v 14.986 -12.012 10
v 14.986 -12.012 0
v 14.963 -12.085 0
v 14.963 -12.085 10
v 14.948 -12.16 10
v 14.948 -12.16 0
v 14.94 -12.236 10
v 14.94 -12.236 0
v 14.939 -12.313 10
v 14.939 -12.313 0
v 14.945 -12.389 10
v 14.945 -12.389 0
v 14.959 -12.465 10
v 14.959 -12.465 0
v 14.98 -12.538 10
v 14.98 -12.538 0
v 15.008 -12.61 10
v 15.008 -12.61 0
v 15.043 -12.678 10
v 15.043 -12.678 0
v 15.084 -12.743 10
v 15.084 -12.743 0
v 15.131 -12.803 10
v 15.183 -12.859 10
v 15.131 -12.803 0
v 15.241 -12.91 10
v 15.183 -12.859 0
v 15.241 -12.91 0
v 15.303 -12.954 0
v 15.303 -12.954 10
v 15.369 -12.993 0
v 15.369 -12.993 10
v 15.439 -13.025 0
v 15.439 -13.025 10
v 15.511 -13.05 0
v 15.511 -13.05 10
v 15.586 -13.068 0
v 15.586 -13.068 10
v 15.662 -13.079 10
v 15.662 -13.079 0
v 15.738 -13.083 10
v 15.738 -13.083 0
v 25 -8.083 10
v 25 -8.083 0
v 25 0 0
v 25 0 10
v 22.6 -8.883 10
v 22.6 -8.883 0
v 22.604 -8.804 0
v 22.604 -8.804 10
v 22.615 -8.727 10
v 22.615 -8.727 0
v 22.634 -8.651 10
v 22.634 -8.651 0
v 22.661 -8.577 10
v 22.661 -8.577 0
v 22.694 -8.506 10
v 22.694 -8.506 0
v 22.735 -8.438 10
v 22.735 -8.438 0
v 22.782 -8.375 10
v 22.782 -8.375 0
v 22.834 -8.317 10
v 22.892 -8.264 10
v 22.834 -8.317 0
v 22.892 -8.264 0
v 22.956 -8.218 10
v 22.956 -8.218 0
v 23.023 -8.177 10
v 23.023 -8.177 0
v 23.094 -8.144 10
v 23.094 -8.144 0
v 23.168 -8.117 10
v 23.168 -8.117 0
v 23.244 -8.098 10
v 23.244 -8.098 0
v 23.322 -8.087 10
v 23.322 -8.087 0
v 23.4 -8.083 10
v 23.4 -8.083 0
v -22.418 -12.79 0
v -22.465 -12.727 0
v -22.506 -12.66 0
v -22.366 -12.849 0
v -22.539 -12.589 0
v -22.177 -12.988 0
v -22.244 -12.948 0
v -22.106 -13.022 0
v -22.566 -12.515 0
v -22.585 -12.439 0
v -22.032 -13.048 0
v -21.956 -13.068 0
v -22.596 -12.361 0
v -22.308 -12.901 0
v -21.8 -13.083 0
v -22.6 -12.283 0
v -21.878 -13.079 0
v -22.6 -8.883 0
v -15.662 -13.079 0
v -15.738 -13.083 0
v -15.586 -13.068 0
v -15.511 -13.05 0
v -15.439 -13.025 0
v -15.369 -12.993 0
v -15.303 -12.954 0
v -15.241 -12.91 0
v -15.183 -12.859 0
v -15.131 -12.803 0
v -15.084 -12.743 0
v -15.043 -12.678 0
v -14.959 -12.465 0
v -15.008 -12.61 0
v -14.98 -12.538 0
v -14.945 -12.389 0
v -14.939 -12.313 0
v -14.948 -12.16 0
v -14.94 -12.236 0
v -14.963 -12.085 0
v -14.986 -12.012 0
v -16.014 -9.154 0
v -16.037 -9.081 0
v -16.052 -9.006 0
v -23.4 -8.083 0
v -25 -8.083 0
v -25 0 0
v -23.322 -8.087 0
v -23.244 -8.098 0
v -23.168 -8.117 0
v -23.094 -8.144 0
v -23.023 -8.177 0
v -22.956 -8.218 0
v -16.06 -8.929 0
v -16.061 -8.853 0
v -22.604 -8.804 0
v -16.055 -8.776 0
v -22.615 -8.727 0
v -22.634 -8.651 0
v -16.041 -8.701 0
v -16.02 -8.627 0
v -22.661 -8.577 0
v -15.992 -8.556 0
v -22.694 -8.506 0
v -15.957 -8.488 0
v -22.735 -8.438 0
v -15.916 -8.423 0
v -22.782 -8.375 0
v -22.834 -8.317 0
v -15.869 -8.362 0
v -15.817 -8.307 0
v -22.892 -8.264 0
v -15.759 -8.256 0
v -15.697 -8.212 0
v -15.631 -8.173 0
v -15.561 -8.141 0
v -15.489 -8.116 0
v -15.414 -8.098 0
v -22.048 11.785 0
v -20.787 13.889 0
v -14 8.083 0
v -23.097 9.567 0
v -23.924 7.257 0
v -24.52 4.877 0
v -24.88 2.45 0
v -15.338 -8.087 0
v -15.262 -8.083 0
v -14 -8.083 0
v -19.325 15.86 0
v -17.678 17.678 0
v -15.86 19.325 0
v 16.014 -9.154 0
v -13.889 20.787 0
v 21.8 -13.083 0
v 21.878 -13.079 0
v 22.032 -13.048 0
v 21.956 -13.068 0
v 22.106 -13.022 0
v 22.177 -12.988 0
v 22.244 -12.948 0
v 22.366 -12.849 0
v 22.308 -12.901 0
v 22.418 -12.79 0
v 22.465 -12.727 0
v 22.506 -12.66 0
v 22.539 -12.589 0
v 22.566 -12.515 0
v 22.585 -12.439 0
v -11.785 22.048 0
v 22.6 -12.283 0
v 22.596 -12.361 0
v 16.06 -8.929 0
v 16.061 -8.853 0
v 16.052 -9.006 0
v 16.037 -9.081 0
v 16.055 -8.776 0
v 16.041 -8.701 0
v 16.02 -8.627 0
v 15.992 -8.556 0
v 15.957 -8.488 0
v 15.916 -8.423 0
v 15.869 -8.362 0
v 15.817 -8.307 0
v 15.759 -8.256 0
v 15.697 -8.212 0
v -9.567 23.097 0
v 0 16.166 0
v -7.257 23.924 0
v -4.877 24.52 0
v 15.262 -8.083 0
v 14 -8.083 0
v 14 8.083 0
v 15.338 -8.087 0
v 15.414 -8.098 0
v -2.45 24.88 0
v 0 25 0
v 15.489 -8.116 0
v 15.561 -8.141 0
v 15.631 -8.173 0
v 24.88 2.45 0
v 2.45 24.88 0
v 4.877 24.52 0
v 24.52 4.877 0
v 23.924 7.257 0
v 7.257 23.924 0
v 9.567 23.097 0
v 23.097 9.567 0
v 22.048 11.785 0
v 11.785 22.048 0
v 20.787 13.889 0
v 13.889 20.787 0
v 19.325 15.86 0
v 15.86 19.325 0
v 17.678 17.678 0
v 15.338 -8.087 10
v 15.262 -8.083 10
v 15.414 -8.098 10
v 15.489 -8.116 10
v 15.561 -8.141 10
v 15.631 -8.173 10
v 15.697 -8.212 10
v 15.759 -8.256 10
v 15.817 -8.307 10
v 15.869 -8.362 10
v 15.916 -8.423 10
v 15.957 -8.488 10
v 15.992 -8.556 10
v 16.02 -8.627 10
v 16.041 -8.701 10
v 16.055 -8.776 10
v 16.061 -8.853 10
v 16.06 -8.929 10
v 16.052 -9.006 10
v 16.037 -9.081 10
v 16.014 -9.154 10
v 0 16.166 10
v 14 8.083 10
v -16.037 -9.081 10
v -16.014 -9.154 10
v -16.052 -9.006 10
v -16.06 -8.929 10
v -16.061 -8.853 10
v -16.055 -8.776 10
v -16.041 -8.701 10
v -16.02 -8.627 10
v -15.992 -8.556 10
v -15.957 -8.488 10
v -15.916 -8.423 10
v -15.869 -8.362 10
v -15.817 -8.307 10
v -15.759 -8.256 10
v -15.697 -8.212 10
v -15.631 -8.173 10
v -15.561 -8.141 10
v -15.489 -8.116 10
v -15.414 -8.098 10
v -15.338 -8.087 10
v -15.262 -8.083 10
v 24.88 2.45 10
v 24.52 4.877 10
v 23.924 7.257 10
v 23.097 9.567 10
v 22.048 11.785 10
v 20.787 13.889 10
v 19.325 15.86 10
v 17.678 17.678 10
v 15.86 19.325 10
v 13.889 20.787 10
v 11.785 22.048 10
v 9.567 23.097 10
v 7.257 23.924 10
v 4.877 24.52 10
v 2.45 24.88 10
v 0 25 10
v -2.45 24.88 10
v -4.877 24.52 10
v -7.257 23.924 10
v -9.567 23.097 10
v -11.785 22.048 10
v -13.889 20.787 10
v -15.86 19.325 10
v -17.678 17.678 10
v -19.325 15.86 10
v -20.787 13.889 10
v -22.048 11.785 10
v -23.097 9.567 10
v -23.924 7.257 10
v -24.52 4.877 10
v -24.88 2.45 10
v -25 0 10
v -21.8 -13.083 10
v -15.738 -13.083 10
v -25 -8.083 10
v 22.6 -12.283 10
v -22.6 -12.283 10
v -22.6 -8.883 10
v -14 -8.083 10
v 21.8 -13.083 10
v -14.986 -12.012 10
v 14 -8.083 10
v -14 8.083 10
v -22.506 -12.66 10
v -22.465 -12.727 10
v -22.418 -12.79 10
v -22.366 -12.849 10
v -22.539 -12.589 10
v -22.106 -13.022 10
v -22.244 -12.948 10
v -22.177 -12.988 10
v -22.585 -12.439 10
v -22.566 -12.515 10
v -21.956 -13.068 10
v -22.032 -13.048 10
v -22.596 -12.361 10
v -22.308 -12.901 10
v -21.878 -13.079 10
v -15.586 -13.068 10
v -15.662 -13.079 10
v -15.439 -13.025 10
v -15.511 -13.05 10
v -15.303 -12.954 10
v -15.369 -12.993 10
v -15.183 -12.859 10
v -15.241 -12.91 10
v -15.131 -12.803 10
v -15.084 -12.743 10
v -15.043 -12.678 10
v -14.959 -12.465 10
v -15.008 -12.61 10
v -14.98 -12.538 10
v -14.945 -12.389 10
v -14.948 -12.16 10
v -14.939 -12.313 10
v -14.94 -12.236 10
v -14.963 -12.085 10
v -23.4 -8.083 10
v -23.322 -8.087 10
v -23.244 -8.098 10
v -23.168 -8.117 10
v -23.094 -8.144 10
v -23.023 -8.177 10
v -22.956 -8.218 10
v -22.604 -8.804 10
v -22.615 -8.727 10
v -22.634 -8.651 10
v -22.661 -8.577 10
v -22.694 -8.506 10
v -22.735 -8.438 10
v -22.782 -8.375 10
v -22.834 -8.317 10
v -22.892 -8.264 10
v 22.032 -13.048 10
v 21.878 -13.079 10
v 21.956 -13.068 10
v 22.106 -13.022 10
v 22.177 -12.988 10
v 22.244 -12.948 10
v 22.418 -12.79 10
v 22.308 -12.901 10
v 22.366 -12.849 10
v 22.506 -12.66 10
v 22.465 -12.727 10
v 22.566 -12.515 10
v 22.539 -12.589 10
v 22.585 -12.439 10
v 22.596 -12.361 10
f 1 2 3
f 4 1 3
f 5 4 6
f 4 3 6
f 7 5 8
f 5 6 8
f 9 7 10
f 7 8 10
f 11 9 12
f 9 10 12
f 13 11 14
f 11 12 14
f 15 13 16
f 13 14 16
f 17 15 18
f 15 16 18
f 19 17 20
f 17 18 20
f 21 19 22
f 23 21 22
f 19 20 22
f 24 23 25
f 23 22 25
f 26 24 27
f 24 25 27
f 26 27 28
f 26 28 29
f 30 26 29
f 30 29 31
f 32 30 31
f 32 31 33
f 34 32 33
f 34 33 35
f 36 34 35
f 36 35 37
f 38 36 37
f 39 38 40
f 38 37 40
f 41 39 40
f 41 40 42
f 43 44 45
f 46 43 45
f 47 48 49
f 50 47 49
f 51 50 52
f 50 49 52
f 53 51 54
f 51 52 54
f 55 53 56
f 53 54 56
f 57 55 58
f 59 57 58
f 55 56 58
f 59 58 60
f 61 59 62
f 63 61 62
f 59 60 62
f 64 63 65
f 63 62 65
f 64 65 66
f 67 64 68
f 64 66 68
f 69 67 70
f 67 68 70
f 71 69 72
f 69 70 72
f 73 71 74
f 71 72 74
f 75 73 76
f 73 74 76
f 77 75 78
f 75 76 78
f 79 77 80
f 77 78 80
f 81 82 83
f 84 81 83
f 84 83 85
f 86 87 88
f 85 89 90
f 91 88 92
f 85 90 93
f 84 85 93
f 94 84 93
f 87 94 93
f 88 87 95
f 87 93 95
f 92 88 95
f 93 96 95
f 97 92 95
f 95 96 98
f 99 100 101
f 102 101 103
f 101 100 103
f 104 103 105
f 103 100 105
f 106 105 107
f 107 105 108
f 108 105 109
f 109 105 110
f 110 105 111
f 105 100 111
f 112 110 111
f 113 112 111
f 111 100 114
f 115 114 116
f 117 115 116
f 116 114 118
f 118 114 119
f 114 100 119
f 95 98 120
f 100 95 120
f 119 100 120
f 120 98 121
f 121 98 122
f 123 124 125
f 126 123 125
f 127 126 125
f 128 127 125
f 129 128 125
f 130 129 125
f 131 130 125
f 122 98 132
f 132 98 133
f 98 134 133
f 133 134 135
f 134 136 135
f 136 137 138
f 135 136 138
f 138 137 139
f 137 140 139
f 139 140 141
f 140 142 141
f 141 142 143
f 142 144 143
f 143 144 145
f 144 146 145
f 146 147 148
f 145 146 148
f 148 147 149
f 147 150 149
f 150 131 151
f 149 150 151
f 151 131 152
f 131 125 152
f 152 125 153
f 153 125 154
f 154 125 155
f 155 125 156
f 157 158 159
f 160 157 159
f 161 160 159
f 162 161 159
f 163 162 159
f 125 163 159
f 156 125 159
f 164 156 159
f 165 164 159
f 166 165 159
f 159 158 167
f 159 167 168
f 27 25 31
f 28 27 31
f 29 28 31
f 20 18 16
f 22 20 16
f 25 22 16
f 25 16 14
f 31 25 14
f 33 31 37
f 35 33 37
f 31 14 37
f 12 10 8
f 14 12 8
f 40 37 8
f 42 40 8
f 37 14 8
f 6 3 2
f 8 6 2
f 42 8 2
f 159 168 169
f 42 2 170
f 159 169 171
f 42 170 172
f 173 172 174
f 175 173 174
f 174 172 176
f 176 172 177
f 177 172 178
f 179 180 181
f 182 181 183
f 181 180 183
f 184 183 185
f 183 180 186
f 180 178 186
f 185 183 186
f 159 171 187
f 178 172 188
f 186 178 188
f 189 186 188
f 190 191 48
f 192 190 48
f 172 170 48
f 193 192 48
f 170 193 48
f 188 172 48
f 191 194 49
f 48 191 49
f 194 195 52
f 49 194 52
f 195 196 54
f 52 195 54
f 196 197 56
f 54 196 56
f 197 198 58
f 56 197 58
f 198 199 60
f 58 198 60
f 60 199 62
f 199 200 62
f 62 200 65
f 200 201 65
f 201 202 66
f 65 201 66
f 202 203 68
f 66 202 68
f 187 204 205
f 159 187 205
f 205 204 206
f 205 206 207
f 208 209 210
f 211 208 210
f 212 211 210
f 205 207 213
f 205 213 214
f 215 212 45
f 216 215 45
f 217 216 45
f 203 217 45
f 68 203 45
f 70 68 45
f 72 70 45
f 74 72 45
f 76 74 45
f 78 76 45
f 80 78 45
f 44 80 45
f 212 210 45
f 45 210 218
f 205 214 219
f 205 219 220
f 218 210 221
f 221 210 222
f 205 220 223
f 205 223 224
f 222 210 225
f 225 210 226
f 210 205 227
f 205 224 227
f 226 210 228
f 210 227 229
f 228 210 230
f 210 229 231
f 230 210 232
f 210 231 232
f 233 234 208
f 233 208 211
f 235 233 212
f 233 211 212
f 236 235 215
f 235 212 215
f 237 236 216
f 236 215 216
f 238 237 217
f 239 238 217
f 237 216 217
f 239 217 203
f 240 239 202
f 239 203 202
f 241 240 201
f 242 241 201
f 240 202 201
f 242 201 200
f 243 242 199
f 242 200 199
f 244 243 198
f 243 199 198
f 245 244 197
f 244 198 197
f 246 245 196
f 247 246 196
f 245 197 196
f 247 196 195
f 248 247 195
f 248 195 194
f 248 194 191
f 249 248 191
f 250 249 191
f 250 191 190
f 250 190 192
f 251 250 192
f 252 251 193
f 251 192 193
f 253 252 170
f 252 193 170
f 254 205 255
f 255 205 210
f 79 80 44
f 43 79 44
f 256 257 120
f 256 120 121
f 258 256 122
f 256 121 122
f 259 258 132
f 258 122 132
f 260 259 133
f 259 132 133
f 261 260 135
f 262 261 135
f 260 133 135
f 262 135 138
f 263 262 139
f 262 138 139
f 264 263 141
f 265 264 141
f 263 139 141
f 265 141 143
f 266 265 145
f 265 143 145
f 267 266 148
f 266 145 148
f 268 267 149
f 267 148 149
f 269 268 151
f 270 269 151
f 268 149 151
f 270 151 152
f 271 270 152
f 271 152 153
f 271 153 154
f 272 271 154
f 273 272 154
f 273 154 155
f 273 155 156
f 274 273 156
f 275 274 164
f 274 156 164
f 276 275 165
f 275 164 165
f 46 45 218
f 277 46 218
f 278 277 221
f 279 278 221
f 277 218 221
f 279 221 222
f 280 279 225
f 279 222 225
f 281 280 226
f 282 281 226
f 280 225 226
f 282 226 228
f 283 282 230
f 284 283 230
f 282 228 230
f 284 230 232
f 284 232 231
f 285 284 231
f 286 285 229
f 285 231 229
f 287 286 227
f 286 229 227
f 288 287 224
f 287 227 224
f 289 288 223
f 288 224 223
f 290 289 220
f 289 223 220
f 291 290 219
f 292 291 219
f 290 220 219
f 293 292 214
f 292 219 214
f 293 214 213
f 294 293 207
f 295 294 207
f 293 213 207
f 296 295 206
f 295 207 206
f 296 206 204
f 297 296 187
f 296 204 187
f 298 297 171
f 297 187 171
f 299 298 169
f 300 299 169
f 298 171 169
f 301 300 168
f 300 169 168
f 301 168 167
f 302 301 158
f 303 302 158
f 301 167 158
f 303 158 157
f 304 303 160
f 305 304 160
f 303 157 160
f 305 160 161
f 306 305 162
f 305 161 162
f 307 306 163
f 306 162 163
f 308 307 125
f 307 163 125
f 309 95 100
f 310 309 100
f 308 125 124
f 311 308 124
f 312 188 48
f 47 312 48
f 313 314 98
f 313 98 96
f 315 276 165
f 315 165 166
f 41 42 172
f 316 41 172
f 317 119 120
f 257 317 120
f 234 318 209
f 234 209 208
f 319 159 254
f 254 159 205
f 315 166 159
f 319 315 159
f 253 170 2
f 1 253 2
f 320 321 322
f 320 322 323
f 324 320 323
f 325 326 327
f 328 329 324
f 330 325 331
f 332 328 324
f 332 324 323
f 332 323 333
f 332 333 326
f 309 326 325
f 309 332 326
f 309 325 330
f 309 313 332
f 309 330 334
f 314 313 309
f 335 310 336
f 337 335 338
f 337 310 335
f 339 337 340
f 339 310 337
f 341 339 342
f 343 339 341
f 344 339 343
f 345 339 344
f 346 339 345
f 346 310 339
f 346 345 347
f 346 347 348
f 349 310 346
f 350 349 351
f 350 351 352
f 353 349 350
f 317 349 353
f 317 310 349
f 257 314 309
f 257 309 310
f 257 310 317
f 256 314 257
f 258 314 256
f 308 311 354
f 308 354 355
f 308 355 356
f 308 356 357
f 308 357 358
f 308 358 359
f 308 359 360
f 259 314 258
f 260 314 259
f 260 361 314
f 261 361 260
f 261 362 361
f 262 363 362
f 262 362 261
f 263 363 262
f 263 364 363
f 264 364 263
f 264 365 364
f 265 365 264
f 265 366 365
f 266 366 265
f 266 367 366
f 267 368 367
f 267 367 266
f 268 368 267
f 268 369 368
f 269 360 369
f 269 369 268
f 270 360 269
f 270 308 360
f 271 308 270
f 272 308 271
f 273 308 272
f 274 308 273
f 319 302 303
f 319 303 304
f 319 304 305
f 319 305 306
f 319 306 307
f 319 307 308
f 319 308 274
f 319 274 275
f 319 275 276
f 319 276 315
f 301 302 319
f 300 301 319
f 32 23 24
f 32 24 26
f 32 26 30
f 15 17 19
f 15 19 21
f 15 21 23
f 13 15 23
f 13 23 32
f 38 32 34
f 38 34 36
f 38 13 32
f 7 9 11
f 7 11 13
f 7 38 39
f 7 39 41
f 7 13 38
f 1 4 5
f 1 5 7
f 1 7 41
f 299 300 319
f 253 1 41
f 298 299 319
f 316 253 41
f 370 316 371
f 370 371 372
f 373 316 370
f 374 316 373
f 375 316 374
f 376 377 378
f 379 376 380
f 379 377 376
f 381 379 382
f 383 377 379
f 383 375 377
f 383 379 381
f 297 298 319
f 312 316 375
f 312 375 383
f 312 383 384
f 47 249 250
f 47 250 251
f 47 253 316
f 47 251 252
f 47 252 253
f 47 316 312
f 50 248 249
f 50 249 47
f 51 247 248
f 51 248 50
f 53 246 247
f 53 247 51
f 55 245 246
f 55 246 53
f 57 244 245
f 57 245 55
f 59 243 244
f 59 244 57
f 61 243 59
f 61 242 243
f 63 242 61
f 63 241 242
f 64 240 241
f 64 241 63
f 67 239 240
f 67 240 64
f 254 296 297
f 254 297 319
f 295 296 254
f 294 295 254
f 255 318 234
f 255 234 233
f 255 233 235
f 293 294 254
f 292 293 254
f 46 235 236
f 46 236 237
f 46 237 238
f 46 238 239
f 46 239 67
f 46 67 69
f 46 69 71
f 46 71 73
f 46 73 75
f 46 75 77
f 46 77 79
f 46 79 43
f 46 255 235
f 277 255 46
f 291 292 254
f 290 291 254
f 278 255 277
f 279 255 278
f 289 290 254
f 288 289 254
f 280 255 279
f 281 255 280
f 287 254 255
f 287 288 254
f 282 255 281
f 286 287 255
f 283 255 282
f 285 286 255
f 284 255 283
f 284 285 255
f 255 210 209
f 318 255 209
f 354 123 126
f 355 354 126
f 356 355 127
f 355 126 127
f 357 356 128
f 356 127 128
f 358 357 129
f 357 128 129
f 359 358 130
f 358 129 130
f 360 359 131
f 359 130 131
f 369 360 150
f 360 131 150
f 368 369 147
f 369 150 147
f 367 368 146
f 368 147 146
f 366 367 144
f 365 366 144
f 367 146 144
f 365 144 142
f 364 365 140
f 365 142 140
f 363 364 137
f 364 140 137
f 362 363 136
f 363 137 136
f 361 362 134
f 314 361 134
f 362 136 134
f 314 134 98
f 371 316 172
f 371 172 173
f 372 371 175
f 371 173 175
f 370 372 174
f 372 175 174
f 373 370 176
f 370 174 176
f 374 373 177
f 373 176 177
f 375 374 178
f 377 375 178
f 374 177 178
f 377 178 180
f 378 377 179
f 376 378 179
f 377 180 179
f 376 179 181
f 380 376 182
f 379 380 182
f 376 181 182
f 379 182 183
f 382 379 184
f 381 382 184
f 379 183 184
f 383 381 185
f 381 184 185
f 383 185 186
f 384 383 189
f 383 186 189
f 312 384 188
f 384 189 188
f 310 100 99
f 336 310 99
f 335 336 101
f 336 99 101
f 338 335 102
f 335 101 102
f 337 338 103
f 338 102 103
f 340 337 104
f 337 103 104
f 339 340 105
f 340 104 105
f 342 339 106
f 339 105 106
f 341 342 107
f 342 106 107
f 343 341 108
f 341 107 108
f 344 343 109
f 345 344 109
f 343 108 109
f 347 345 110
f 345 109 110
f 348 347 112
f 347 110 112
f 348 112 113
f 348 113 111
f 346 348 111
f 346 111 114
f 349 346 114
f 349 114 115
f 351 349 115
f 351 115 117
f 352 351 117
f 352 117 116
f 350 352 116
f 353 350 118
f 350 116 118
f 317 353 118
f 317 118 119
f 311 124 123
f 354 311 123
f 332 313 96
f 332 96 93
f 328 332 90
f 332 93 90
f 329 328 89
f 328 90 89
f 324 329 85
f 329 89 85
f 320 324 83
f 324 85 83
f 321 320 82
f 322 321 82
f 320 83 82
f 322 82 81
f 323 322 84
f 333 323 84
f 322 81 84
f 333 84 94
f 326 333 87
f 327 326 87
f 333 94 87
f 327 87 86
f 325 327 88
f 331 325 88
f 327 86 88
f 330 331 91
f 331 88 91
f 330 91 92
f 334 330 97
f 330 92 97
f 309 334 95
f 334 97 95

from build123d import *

# Parameters (mm, degrees)
F1_DEPTH = 10


with BuildPart() as f1:
    # F0 (on Top) → F1 (new body)
    with BuildSketch(Plane.XY):
        with BuildLine():
            Line((0, 16.165808), (14, 8.082904))
            Line((14, 8.082904), (14, -8.082904))
            Line((14, -8.082904), (15.261739, -8.082904))
            ThreePointArc((15.261739, -8.082904), (15.916254, -8.422893), (16.014449, -9.153879))
            Line((16.014449, -9.153879), (14.985551, -12.011928))
            ThreePointArc((14.985551, -12.011928), (15.083746, -12.742914), (15.738261, -13.082904))
            Line((15.738261, -13.082904), (21.8, -13.082904))
            ThreePointArc((21.8, -13.082904), (22.365685, -12.848589), (22.6, -12.282904))
            Line((22.6, -12.282904), (22.6, -8.882904))
            ThreePointArc((22.6, -8.882904), (22.834315, -8.317218), (23.4, -8.082904))
            Line((23.4, -8.082904), (25, -8.082904))
            Line((25, -8.082904), (25, -7.882904))
            Line((25, -7.882904), (25, 0))
            ThreePointArc((25, 0), (0, 25), (-25, 0))
            Line((-25, 0), (-25, -7.882904))
            Line((-25, -7.882904), (-25, -8.082904))
            Line((-25, -8.082904), (-23.4, -8.082904))
            ThreePointArc((-23.4, -8.082904), (-22.834315, -8.317218), (-22.6, -8.882904))
            Line((-22.6, -8.882904), (-22.6, -12.282904))
            ThreePointArc((-22.6, -12.282904), (-22.365685, -12.848589), (-21.8, -13.082904))
            Line((-21.8, -13.082904), (-15.738261, -13.082904))
            ThreePointArc((-15.738261, -13.082904), (-15.083746, -12.742914), (-14.985551, -12.011928))
            Line((-14.985551, -12.011928), (-16.014449, -9.153879))
            ThreePointArc((-16.014449, -9.153879), (-15.916254, -8.422893), (-15.261739, -8.082904))
            Line((-15.261739, -8.082904), (-14, -8.082904))
            Line((-14, -8.082904), (-14, 8.082904))
            Line((-14, 8.082904), (0, 16.165808))
        make_face()
    extrude(amount=F1_DEPTH)


solid = f1.part
